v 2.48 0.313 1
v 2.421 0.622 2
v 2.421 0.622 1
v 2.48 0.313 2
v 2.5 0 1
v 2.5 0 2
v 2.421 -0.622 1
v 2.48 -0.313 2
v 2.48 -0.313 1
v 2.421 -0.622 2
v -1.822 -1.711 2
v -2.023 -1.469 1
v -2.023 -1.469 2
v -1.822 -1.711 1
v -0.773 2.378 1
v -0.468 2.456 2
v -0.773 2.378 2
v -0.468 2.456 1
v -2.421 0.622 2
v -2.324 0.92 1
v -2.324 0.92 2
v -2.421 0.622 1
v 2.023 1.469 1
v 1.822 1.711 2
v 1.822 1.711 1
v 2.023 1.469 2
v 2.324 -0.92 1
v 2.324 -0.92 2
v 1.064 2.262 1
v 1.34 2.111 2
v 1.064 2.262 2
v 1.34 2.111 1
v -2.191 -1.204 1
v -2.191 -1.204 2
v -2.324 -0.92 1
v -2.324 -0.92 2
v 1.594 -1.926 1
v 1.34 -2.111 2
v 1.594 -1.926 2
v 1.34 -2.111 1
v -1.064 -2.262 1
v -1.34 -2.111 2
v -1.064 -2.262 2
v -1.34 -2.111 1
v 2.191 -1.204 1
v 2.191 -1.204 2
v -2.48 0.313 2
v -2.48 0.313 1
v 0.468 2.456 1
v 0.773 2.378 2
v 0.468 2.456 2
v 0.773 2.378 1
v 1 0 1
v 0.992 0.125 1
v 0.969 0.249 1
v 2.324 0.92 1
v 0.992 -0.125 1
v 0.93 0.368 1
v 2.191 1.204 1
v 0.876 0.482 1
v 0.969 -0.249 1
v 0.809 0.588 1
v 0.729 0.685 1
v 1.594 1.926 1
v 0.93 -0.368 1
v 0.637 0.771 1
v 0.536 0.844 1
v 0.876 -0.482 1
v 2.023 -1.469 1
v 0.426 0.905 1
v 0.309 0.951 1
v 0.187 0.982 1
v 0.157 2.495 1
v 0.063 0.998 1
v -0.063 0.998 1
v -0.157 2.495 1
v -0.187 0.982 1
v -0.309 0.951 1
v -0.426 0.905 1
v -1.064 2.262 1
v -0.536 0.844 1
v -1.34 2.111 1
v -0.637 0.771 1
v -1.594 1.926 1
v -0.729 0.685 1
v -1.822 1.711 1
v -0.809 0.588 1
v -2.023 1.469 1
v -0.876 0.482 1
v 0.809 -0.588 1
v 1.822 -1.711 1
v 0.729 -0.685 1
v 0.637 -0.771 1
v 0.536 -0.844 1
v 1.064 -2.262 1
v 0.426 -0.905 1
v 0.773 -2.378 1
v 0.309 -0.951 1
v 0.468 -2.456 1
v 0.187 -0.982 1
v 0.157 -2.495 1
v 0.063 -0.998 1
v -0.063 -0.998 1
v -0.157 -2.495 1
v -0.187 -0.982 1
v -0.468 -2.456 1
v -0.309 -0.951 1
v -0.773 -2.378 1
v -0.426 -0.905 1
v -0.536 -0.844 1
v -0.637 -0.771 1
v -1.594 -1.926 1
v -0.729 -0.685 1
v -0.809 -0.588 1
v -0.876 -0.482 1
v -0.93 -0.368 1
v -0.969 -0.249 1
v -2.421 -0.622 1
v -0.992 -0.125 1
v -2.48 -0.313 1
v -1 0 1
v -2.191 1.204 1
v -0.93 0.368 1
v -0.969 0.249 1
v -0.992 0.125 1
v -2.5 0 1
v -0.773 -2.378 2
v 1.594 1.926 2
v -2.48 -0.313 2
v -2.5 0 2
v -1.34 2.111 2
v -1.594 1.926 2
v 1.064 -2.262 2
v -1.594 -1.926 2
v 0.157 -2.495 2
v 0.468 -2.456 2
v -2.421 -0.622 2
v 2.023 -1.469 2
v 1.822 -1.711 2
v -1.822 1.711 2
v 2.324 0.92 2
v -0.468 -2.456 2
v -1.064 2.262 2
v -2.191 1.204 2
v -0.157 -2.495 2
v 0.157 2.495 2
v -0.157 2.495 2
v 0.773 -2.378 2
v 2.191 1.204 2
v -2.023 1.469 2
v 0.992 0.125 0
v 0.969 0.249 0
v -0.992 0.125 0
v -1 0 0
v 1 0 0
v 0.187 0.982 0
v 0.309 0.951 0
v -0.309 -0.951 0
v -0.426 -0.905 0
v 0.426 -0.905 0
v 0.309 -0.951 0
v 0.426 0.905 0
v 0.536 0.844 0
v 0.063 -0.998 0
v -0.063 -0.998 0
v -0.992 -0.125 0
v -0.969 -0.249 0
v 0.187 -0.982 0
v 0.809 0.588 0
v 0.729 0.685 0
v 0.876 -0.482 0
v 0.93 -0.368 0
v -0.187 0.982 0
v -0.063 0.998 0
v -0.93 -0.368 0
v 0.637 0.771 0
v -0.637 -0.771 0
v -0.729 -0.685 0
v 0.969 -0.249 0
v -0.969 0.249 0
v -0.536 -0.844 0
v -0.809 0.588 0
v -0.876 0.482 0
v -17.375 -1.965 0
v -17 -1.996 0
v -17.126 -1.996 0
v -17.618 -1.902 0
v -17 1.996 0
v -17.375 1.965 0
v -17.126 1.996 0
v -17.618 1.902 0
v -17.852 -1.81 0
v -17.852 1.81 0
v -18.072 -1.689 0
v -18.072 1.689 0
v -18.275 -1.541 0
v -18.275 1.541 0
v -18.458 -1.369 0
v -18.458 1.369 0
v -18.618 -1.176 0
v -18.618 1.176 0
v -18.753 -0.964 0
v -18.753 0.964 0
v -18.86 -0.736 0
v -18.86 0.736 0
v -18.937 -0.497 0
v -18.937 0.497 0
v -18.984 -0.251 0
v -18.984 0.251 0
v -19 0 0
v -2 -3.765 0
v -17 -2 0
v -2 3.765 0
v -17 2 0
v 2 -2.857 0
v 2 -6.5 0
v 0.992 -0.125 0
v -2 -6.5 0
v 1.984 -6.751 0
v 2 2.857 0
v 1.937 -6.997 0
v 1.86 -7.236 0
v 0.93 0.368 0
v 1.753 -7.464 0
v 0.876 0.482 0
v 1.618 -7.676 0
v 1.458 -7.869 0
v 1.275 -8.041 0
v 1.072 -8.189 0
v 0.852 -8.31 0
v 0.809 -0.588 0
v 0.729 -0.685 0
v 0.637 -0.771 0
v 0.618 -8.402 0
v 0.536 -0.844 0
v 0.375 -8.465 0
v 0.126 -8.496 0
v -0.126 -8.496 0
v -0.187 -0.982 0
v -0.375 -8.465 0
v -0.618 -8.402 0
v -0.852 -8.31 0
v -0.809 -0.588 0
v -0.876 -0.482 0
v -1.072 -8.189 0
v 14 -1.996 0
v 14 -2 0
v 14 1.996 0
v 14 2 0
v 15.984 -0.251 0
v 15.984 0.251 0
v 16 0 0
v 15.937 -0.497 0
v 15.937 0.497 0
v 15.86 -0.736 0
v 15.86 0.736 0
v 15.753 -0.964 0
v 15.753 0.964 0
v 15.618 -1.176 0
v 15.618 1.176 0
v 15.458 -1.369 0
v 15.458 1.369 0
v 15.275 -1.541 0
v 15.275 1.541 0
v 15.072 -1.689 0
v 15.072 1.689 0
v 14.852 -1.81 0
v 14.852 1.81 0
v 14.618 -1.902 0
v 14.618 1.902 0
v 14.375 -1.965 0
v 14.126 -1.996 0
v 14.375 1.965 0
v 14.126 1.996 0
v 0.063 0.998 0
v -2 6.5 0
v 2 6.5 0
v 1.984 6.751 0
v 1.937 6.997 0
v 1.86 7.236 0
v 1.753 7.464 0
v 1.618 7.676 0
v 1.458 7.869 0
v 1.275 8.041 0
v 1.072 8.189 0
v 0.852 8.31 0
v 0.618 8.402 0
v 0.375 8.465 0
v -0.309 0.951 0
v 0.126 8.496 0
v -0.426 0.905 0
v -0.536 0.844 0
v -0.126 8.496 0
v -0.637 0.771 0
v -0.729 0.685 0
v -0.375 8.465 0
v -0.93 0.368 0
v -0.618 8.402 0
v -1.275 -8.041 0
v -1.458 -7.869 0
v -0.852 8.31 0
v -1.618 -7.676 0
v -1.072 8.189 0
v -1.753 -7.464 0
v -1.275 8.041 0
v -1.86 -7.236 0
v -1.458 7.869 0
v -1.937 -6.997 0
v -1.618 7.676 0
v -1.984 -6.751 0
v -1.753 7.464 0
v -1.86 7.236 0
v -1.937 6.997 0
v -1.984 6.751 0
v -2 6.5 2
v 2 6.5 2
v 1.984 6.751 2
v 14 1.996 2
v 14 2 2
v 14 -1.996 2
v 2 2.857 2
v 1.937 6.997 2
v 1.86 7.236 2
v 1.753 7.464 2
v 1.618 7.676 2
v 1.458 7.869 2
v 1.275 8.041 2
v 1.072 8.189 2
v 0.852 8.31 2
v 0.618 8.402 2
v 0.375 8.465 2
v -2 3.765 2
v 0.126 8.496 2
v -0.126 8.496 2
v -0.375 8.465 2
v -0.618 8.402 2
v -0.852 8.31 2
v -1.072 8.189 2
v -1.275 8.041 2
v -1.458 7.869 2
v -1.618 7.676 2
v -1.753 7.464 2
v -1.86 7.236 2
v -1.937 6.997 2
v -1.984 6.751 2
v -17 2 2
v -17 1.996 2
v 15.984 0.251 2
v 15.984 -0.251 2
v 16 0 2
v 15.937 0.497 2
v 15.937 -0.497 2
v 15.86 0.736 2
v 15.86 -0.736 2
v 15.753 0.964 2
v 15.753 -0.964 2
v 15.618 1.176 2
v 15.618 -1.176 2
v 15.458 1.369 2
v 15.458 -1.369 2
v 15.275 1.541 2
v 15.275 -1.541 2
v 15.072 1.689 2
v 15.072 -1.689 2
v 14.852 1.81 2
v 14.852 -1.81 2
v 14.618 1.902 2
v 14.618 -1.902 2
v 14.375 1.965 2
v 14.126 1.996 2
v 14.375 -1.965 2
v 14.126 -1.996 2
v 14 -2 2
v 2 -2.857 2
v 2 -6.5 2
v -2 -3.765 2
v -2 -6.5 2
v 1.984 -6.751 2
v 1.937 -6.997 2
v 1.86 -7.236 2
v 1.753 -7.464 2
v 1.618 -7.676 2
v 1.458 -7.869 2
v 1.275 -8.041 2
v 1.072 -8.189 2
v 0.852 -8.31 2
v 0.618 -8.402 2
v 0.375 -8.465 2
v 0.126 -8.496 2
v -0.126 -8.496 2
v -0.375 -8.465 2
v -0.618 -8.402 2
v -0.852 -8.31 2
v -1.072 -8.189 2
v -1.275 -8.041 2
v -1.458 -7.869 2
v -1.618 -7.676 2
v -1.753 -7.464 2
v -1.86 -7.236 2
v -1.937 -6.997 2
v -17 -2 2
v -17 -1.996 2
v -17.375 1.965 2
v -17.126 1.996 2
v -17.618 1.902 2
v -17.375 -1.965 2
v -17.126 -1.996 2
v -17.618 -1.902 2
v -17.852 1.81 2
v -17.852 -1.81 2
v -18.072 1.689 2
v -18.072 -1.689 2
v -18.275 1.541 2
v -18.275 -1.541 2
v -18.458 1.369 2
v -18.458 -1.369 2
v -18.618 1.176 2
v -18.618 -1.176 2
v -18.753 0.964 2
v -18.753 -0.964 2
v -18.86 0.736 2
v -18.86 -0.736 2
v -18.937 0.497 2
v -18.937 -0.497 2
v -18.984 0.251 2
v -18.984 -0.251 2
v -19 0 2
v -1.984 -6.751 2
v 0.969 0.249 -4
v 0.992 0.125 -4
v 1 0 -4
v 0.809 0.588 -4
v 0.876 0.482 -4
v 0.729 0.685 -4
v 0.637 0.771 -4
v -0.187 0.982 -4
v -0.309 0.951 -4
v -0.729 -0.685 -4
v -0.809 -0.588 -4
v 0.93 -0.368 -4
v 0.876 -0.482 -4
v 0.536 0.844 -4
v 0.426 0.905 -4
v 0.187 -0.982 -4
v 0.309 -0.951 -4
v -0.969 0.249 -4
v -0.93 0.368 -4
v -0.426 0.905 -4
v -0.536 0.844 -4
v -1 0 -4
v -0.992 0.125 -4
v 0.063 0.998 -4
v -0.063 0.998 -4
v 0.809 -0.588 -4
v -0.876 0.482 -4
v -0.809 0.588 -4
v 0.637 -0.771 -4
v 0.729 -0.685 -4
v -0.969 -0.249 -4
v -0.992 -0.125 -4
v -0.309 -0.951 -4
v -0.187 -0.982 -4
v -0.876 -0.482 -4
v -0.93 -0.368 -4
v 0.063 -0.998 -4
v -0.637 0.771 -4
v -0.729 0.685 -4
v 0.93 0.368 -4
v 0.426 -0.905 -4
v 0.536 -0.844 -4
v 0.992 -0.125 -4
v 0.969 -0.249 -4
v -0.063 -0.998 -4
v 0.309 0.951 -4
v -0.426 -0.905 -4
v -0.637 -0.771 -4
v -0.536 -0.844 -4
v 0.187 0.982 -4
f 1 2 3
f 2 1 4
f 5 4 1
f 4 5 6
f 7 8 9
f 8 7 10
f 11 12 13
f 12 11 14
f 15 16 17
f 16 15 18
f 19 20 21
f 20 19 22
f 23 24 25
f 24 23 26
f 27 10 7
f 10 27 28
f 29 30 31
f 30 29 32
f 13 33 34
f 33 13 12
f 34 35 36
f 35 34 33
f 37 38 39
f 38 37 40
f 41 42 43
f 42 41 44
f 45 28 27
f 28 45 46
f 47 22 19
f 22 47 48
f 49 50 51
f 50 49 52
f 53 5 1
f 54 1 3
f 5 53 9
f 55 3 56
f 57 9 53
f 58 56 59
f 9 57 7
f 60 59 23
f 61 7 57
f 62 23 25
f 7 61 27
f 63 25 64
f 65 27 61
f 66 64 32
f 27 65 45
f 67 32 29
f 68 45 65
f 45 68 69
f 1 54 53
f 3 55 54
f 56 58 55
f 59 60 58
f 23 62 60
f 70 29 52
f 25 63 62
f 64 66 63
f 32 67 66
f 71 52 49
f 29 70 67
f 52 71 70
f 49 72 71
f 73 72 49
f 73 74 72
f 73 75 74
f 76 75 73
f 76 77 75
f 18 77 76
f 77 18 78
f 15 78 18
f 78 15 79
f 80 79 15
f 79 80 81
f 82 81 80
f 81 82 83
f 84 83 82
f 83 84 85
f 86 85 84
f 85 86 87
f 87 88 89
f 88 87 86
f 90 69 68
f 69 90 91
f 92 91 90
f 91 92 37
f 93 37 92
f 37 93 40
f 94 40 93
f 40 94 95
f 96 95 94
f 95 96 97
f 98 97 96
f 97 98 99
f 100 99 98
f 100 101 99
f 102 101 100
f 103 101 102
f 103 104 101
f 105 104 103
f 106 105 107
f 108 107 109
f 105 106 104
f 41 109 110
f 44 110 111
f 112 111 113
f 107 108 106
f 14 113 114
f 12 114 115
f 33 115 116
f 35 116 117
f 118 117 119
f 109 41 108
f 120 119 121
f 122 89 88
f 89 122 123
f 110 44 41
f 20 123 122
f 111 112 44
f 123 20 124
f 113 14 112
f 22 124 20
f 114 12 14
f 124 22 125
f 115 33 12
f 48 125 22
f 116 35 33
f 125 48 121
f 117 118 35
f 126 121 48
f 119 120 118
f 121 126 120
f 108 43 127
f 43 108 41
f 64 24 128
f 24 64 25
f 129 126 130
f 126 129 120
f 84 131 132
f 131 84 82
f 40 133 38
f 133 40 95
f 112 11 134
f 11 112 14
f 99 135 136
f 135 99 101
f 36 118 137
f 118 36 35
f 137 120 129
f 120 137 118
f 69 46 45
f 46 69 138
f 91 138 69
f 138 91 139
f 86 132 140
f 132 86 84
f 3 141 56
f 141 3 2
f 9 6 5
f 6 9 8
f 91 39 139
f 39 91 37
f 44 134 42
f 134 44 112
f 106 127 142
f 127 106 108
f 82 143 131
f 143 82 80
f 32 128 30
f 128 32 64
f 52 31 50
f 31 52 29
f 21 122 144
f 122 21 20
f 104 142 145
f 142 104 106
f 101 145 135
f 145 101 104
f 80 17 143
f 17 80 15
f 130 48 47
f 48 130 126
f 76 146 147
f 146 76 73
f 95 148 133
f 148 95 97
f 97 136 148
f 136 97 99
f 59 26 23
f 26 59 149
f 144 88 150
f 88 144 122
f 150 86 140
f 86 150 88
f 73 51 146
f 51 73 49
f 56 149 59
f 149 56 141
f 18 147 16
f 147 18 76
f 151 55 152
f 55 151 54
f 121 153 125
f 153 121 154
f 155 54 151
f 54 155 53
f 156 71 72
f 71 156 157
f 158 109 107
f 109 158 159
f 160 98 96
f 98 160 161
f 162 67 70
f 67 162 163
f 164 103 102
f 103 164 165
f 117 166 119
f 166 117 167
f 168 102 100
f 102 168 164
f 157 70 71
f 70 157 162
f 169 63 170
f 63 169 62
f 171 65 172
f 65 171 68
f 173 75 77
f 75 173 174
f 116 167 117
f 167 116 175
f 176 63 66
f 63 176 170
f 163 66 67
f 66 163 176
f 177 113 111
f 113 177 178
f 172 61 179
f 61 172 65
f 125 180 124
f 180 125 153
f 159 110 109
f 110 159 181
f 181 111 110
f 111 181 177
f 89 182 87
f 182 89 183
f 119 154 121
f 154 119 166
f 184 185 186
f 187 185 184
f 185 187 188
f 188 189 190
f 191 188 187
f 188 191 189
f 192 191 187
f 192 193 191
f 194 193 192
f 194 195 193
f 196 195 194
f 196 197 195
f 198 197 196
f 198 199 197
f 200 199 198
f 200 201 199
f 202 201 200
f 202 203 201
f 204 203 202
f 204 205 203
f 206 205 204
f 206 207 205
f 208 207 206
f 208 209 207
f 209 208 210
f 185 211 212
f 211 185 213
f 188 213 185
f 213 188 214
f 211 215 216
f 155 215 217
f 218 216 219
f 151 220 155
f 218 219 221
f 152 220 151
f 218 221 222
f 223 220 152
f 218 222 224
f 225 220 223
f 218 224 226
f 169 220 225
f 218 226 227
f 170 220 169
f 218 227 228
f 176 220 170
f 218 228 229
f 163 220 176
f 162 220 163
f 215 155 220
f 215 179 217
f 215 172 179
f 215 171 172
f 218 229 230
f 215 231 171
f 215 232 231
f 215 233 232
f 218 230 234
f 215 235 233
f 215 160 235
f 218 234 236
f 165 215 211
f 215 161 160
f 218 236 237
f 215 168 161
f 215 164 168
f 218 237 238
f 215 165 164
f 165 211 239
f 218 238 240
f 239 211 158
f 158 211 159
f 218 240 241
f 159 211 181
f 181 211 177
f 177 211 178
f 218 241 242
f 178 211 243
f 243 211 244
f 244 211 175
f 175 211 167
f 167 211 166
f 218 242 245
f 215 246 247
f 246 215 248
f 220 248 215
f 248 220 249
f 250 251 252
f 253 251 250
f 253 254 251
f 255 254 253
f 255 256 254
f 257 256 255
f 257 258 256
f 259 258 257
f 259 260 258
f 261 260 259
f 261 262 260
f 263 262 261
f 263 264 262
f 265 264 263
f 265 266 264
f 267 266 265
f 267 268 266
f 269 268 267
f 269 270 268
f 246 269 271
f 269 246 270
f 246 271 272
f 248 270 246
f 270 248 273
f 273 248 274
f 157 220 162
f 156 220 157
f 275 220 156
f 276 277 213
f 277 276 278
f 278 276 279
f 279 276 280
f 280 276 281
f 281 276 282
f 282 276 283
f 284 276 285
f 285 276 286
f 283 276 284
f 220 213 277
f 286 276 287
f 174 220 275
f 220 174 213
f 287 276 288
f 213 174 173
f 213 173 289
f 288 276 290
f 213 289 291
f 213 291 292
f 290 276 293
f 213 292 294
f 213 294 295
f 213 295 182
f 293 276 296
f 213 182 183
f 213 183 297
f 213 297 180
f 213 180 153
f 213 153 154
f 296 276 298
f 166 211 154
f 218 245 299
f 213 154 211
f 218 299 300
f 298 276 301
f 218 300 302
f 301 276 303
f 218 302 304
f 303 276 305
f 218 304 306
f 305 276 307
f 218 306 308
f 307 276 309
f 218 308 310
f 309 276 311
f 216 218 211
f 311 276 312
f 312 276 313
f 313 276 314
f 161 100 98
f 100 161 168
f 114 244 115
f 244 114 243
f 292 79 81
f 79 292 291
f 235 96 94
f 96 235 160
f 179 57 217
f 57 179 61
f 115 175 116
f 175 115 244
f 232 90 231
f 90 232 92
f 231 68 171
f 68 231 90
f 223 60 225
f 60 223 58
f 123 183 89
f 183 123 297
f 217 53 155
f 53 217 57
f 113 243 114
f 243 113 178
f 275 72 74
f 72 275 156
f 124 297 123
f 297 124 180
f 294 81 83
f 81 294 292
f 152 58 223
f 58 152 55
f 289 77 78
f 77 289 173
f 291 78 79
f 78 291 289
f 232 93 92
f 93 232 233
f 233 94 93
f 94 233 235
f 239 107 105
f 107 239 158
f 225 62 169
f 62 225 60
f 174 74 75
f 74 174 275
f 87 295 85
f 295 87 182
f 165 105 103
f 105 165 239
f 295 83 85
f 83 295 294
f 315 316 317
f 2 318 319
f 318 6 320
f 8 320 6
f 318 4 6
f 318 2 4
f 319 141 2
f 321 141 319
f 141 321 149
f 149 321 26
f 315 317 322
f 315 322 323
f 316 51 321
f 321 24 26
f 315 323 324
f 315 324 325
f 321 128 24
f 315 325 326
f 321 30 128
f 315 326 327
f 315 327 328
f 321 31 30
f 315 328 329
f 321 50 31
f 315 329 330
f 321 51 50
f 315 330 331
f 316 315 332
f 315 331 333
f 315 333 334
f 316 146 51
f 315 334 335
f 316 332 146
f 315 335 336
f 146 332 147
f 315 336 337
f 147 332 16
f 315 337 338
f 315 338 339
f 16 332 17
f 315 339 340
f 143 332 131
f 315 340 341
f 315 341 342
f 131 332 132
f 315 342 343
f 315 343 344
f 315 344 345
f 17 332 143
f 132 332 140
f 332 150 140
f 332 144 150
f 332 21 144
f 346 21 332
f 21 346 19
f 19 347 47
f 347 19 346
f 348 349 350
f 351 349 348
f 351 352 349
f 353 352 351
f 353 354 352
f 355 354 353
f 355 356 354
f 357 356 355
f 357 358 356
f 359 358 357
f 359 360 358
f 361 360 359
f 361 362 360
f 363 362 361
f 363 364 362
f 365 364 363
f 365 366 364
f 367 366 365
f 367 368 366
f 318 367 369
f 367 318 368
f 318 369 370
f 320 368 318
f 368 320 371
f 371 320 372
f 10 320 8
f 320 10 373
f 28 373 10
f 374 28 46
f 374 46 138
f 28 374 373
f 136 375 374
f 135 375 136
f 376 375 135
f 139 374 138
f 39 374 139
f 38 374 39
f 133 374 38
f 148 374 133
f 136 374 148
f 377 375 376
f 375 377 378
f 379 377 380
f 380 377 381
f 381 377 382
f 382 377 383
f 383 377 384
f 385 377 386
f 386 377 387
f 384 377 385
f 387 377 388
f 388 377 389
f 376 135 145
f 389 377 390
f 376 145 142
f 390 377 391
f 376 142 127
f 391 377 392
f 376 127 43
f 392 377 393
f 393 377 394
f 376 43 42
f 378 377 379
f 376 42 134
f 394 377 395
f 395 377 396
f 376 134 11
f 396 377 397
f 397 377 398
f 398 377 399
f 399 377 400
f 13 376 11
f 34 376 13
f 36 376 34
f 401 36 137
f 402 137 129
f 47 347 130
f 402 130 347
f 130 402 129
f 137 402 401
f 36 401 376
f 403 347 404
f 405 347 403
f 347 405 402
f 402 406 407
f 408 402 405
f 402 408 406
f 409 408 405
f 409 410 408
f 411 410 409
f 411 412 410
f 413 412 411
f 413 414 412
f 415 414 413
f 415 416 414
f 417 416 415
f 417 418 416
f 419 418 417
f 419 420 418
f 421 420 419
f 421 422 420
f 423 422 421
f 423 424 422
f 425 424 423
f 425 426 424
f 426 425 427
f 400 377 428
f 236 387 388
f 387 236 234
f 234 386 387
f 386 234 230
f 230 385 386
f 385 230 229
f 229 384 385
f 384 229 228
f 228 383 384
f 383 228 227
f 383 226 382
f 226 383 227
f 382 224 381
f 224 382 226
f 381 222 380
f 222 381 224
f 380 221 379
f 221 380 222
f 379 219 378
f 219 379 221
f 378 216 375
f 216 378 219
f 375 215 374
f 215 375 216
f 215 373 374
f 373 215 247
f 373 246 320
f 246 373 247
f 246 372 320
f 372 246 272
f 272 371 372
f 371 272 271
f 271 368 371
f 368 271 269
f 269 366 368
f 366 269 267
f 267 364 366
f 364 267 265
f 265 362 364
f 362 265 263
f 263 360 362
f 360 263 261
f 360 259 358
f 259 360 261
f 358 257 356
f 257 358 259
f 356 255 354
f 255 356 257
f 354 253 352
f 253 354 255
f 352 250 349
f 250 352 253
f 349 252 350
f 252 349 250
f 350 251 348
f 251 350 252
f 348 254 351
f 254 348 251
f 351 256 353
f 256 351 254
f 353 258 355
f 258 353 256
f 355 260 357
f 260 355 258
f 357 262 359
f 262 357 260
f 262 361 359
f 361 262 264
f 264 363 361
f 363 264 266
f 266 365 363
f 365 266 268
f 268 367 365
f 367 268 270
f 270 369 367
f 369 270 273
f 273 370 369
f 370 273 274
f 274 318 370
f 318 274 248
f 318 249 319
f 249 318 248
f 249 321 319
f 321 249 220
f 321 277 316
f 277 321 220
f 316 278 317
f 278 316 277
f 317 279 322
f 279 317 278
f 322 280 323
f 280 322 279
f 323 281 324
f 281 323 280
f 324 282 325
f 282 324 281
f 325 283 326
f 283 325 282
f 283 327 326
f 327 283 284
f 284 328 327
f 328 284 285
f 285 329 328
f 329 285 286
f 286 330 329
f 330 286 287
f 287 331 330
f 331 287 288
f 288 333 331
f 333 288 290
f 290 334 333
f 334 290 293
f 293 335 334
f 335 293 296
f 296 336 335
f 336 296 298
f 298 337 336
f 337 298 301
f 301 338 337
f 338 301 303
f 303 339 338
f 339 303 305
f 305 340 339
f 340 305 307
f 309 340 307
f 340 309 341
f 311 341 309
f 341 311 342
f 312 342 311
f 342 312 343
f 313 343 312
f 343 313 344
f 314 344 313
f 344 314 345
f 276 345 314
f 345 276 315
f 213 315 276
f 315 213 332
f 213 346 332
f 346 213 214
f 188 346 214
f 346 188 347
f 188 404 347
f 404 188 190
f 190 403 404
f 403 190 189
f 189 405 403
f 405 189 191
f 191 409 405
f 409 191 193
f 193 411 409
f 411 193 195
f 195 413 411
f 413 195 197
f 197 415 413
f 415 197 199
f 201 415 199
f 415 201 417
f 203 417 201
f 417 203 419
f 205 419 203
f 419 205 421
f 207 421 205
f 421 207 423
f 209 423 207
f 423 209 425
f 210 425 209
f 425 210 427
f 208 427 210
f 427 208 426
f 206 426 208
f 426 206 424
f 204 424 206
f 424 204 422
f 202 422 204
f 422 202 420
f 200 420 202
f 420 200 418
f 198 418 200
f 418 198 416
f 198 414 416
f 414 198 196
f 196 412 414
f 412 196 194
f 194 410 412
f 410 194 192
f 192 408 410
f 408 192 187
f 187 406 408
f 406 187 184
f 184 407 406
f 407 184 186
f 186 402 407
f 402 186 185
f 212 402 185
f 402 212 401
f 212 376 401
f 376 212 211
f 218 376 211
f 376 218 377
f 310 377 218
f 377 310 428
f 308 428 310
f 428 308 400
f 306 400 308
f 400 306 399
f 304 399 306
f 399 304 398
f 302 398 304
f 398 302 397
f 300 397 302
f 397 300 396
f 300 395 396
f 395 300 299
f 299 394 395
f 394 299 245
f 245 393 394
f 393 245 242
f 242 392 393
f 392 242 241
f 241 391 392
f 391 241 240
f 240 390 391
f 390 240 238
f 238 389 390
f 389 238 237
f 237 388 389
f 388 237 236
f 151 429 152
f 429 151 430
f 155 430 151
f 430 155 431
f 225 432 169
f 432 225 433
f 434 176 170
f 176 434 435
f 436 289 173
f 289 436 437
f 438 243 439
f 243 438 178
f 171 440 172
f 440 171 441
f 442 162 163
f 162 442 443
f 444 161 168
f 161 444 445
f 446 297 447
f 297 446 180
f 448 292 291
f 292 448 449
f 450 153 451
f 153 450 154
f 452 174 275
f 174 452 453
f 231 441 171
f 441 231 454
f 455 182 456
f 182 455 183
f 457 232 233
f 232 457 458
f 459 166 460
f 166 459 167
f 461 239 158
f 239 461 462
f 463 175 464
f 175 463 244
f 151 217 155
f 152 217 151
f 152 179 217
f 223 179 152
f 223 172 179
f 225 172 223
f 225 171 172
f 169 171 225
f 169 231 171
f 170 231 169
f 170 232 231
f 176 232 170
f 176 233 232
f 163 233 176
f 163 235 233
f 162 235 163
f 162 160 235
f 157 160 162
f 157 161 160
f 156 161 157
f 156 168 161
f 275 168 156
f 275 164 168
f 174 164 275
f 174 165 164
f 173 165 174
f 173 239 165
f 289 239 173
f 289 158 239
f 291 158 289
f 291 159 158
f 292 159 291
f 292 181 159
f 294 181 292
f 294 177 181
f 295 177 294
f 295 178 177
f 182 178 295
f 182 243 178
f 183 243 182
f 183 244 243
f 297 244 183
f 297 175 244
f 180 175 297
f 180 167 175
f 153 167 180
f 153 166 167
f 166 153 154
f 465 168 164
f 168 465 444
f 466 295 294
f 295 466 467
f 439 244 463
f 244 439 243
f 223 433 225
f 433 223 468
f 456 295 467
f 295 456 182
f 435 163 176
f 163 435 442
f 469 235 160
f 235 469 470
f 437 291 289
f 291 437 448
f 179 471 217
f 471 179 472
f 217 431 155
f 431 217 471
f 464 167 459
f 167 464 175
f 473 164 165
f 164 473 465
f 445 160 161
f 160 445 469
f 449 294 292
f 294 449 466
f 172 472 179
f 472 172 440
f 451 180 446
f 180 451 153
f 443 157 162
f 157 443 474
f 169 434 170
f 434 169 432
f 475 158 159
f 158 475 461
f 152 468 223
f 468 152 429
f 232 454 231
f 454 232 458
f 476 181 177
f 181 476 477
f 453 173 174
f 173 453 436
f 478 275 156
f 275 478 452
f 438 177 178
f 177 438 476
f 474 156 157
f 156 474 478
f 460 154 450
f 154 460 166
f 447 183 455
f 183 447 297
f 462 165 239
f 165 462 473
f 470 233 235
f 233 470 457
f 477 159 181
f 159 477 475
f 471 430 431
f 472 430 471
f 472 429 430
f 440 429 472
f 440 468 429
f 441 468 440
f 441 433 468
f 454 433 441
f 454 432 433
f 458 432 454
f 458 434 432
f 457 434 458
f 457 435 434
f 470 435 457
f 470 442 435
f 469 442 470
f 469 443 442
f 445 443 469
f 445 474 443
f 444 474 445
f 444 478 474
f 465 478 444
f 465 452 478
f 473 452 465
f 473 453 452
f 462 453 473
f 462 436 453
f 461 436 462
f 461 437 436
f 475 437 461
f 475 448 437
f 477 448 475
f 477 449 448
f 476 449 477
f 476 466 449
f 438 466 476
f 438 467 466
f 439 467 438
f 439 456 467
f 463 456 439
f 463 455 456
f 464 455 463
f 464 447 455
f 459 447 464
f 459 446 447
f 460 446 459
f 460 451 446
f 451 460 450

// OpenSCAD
d1 = 17;
d = 4;
m1 = 8;
m2 = 6;
l1 = 17;
l2 = 14;
fn = 50;

module L(){
    union(){
        polygon([[0,-m1/2], [0,m1/2], 
                 [-l1,d/2], [-l1,-d/2]]);
        translate([-l1,0])
        circle(d/2, $fn=fn);
    }
}
module R(){
    union(){
        polygon([[0,-m2/2], [0,m2/2], 
                [l2,d/2], [l2,-d/2]]);
        translate([l2,0])
        circle(d/2, $fn=fn);
    }
}
module M(){
    l = d1-d;
    union(){
        polygon([[d/2,-l/2], [d/2,l/2], 
                 [-d/2,l/2], [-d/2,-l/2]]);
        translate([0,l/2])
        circle(d/2, $fn=fn);
        translate([0,-l/2])
        circle(d/2, $fn=fn);
    }
}

module servo_cutout(){
    difference(){
        linear_extrude(2){
            L();
            R();
            M();
        }
        union(){
            translate([0,0,1])
            linear_extrude(2){
                circle(2.5, $fn=fn);
            }
            translate([0,0,0])
            linear_extrude(1){
                circle(1, $fn=fn);
            }
        }
    }
}



module servo_pin_extension(){
    h_pin = 4;
    translate([0,0,-h_pin])
    cylinder(h_pin,1, $fn=fn);
}

servo_cutout();
servo_pin_extension();
